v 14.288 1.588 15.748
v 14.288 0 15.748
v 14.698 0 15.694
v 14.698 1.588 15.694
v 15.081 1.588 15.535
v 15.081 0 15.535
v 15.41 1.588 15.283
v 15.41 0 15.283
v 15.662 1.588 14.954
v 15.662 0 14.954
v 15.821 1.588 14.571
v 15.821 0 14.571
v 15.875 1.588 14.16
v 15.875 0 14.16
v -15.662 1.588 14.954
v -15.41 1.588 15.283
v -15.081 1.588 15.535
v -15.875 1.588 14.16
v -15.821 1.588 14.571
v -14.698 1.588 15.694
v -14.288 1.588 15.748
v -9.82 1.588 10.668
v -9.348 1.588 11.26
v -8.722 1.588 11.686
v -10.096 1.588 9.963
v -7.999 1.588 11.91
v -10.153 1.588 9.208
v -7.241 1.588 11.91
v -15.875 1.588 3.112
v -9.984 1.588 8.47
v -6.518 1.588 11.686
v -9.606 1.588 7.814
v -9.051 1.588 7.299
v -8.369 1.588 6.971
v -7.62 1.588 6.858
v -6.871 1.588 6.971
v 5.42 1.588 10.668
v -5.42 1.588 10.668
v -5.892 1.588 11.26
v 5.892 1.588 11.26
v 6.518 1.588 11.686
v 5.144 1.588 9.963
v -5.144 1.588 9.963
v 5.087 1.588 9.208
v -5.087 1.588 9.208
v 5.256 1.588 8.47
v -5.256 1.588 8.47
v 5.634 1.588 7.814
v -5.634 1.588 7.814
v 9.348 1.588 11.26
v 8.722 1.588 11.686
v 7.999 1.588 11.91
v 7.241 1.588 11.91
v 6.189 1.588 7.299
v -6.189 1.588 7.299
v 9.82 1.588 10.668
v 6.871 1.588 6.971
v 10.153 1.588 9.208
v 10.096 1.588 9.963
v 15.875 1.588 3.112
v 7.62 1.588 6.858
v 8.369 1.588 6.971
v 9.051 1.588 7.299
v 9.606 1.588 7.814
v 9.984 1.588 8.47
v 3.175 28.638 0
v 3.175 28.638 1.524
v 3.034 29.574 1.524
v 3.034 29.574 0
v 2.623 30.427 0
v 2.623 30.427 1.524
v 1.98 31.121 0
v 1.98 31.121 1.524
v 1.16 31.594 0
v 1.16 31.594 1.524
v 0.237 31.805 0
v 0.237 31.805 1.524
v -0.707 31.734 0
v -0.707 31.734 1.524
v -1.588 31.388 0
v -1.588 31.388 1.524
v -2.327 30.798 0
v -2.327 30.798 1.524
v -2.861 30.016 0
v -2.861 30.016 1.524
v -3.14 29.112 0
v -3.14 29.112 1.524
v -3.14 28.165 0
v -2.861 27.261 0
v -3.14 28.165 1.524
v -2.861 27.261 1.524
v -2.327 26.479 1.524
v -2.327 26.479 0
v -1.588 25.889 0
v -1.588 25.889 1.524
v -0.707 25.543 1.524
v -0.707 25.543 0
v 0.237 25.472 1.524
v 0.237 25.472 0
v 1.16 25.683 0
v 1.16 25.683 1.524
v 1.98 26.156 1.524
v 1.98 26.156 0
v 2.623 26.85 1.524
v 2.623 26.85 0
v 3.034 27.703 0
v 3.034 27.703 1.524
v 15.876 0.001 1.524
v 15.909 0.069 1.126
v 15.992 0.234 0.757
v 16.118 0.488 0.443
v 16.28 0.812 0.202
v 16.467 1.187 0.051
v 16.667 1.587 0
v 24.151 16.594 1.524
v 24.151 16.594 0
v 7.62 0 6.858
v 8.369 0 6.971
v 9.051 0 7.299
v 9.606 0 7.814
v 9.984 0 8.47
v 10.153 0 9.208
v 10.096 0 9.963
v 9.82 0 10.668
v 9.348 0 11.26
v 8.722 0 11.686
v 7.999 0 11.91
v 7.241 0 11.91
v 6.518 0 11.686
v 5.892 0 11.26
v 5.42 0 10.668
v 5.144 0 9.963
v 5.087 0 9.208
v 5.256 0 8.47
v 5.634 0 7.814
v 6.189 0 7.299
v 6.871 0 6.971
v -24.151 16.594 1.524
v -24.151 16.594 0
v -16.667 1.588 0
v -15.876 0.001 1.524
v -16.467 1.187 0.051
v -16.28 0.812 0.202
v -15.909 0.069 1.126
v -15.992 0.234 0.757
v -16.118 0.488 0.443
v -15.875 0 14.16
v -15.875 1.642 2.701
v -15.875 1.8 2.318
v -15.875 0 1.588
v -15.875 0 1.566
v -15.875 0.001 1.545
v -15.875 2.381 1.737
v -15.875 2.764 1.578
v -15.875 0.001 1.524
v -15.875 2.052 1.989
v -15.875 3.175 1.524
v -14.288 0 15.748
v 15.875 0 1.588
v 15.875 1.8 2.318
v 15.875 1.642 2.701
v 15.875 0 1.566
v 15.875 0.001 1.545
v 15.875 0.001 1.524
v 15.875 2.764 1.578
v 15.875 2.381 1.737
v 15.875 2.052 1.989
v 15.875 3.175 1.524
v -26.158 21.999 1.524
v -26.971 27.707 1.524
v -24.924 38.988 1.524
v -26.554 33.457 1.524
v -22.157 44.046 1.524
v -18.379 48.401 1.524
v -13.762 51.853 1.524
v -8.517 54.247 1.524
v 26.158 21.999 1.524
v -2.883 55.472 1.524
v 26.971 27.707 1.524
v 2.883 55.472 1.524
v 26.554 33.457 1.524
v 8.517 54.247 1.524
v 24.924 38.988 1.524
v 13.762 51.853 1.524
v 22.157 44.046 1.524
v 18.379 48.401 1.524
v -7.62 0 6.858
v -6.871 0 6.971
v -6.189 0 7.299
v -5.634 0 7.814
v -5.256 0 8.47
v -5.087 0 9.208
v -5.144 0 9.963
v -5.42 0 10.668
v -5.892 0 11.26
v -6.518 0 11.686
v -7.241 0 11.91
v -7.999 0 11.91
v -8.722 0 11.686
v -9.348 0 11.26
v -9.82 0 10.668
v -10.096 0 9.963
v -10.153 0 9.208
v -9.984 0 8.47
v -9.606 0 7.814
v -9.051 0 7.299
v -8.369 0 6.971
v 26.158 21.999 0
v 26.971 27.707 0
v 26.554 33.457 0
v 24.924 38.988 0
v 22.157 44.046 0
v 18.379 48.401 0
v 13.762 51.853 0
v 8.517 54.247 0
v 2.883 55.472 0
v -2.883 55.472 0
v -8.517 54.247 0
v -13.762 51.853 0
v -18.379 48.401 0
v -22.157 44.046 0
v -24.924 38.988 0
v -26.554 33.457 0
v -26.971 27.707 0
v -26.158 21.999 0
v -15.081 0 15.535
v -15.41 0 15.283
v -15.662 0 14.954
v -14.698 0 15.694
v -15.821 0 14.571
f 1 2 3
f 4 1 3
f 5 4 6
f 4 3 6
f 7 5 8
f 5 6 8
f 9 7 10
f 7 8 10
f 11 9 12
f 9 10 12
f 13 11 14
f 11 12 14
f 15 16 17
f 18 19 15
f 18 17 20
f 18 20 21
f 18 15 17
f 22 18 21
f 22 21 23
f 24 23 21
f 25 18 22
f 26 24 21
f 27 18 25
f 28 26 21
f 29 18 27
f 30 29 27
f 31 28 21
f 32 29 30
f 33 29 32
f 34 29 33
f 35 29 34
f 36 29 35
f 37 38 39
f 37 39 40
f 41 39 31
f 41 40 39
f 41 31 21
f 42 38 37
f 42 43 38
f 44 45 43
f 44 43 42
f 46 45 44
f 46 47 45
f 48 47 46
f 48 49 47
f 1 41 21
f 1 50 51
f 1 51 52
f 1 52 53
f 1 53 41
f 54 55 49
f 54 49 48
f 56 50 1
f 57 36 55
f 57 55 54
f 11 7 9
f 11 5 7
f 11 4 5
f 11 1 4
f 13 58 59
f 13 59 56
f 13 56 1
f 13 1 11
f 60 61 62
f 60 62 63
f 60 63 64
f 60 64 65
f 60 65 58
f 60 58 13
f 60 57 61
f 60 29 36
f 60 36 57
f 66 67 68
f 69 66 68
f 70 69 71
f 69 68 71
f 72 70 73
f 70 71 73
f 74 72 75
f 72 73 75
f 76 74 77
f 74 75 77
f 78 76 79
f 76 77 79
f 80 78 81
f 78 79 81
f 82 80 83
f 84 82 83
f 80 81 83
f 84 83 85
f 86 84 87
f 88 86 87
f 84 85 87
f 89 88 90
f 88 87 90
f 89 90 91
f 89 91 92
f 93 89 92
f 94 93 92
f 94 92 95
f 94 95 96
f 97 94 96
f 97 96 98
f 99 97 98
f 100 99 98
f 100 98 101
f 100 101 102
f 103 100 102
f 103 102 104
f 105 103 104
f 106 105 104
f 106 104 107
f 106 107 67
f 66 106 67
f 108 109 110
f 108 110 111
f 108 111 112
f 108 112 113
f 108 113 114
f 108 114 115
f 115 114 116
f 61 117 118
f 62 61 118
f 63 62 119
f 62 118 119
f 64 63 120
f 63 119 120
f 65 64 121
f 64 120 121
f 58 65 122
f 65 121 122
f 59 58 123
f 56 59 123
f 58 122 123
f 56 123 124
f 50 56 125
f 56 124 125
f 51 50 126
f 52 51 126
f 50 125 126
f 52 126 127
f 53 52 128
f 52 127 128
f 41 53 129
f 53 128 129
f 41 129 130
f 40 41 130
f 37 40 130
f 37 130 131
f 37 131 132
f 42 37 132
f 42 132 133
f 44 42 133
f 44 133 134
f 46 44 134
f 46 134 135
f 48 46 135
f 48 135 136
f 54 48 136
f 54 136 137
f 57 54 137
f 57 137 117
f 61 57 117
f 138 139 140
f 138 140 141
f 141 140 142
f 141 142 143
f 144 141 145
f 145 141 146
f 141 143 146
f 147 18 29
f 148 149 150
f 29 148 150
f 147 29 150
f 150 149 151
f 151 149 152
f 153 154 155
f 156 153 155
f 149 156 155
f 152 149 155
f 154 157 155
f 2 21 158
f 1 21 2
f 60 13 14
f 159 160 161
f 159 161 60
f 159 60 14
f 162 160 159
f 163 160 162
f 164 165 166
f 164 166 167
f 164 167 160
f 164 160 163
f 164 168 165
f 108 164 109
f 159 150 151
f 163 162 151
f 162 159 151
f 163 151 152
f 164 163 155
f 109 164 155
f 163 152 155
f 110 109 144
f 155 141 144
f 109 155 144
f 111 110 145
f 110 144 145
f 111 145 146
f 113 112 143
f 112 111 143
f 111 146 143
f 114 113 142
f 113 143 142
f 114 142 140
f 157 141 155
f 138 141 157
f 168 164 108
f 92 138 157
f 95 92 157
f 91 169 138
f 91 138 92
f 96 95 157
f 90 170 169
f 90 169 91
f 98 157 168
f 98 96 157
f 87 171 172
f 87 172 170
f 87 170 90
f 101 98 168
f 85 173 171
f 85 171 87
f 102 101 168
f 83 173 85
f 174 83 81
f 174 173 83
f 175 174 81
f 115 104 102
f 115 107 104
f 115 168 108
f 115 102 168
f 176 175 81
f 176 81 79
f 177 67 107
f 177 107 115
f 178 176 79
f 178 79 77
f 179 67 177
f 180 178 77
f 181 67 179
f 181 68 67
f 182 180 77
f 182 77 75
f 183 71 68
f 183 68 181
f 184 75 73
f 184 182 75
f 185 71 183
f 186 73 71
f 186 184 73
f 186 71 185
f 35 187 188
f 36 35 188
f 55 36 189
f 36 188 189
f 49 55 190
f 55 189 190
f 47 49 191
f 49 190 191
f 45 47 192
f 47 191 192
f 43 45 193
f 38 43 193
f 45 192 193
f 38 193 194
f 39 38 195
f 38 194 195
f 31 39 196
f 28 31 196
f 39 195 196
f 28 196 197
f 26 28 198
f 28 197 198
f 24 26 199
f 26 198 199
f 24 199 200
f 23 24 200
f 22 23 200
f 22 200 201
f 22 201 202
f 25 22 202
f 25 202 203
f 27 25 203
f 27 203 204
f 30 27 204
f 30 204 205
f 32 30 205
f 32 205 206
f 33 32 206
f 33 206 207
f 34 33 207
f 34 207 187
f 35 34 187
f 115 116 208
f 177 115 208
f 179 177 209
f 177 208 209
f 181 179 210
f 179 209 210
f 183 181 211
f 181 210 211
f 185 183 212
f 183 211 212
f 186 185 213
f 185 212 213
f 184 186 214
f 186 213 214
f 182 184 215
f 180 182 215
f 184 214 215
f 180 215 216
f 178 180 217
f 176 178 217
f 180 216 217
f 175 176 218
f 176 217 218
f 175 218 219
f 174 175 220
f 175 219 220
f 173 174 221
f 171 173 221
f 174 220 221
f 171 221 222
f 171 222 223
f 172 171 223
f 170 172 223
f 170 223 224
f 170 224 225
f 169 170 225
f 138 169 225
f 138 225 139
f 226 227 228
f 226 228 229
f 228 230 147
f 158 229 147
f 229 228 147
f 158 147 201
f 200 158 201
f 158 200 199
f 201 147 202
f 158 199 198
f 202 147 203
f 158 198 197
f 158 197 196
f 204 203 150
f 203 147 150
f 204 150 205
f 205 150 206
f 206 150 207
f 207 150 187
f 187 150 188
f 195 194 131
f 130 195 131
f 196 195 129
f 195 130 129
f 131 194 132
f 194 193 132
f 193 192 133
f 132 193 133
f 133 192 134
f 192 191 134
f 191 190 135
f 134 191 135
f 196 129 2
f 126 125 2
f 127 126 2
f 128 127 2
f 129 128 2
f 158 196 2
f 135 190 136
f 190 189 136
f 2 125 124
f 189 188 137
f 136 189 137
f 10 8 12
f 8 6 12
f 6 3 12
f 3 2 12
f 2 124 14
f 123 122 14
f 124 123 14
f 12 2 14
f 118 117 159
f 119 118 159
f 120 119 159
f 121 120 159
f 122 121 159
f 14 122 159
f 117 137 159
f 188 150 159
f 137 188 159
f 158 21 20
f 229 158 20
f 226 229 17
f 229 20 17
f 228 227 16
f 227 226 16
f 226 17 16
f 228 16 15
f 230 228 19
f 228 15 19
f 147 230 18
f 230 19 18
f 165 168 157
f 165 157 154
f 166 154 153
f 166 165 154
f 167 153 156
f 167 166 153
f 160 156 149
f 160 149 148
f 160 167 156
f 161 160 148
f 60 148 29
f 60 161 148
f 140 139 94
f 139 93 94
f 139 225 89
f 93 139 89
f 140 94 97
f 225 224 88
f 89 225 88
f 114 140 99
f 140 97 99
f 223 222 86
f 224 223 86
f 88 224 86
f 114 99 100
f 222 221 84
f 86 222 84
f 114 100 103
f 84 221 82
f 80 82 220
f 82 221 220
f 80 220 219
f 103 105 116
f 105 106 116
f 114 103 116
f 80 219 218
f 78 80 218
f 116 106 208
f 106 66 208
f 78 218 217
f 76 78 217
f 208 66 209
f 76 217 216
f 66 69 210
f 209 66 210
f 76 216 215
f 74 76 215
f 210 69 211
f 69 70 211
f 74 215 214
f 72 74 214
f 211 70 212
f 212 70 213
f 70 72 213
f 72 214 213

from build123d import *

# Parameters (mm, degrees)
BOSS_EXTRUDE1_DEPTH = 1.524
SKETCH2_R           = 3.175
CUT_EXTRUDE1_DEPTH  = 62.84577276
SKETCH3_W           = 31.75
SKETCH3_H           = 1.5875
BOSS_EXTRUDE2_DEPTH = 14.224
FILLET1_R           = 1.5875
SKETCH4_R           = 2.54
CUT_EXTRUDE2_DEPTH  = 64.801070024


with BuildPart() as part:
    # Sketch1 → Boss-Extrude1 (new body)
    with BuildSketch(Plane.XY):
        with BuildLine():
            Line((-24.150754652, 16.594156681), (-15.875, 0))
            Line((-15.875, 0), (15.875, 0))
            Line((15.875, 0), (24.150754652, 16.594156681))
            ThreePointArc((24.150754652, 16.594156681), (0, 55.626), (-24.150754652, 16.594156681))
        make_face()
    extrude(amount=BOSS_EXTRUDE1_DEPTH)

    # Sketch2 → Cut-Extrude1 (cut, through all)
    with BuildSketch(Plane.XY.offset(1.524)):
        with Locations((0, 28.6385)):
            Circle(SKETCH2_R)
    extrude(amount=-CUT_EXTRUDE1_DEPTH, mode=Mode.SUBTRACT)

    # Sketch3 → Boss-Extrude2 (add)
    with BuildSketch(Plane.XY.offset(1.524)):
        with Locations((0, 0.79375)):
            Rectangle(SKETCH3_W, SKETCH3_H)
    extrude(amount=BOSS_EXTRUDE2_DEPTH)

    # Fillet1
    # the kernel refuses this fillet: 1.5875 mm, written as the material it adds along each edge
    with BuildSketch(Plane(origin=(15.875, 1.5875, 1.524), x_dir=(0, 1, 0), z_dir=(-1, 0, 0))) as fillet1_piece_1:
        with BuildLine():
            CenterArc((FILLET1_R, -FILLET1_R), FILLET1_R, 90, 90)
            Line((0, -FILLET1_R), (0, 0))
            Line((0, 0), (FILLET1_R, 0))
        make_face()
    extrude(amount=31.75)
    # the kernel refuses this fillet: 1.5875 mm, written as the material it takes off along each edge
    with BuildSketch(Plane(origin=(-15.875, 5.55625, 15.748), x_dir=(1, 0, 0), z_dir=(0, -1, 0))) as fillet1_2_piece_1:
        with BuildLine():
            CenterArc((FILLET1_R, -FILLET1_R), FILLET1_R, 90, 90)
            Line((0, -FILLET1_R), (0, 0))
            Line((0, 0), (FILLET1_R, 0))
        make_face()
    extrude(amount=9.525, mode=Mode.SUBTRACT)
    with BuildSketch(Plane(origin=(15.875, -3.96875, 15.748), x_dir=(0, 0, -1), z_dir=(0, 1, 0))) as fillet1_2_piece_2:
        with BuildLine():
            CenterArc((FILLET1_R, FILLET1_R), FILLET1_R, 180, 90)
            Line((0, FILLET1_R), (0, 0))
            Line((0, 0), (FILLET1_R, 0))
        make_face()
    extrude(amount=9.525, mode=Mode.SUBTRACT)
    with BuildSketch(Plane(origin=(-19.84375, 0, 0), x_dir=(0, 1, 0), z_dir=(1, 0, 0))) as fillet1_2_piece_3:
        with BuildLine():
            CenterArc((FILLET1_R, FILLET1_R), FILLET1_R, 180, 90)
            Line((0, FILLET1_R), (0, 0))
            Line((0, 0), (FILLET1_R, 0))
        make_face()
    extrude(amount=39.6875, mode=Mode.SUBTRACT)

    # Sketch4 → Cut-Extrude2 (cut, through all)
    with BuildSketch(Plane.XZ):
        with Locations(Location((7.62, 9.398, 0), (0, 0, 270))):
            Circle(SKETCH4_R)
        with Locations(Location((-7.62, 9.398, 0), (0, 0, 270))):
            Circle(SKETCH4_R)
    extrude(amount=-CUT_EXTRUDE2_DEPTH, mode=Mode.SUBTRACT)


solid = part.part
